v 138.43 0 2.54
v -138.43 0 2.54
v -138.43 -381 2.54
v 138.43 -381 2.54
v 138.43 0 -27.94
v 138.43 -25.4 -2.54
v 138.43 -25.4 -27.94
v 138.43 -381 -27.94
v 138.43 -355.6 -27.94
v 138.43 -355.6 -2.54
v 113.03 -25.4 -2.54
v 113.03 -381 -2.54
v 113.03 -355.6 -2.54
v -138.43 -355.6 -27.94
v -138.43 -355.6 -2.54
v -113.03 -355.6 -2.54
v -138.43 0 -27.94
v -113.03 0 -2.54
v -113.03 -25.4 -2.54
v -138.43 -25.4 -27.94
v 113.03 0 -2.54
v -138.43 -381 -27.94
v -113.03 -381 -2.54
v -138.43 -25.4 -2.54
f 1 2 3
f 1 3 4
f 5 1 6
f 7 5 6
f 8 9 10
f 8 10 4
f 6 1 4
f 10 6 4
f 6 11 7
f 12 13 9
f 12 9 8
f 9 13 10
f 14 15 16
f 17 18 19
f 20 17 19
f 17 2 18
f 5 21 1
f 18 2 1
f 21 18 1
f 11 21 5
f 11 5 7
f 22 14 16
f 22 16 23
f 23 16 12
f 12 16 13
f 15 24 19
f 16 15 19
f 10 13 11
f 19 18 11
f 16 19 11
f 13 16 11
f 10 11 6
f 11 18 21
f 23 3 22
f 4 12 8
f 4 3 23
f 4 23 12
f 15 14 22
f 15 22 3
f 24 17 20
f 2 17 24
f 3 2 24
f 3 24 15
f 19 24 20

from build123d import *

# Parameters (mm, degrees)
F0_W     = 276.86
F0_H     = 5.08
F1_DEPTH = 381
F2_W     = 25.4
F2_H     = 25.4
F3_DEPTH = 25.4
F4_SIZE  = 25.39999
F5_SIZE  = 25.39999


# Not quite as in the source:
# - a fillet or chamfer is up to 0.001 mm smaller than in the source, because OpenCascade refuses the exact size


with BuildPart() as f1:
    # F0 (on Front) → F1 (new body)
    with BuildSketch(Plane.XZ):
        Rectangle(F0_W, F0_H)
    extrude(amount=F1_DEPTH)

    # F2 (on face) → F3 (join)
    with BuildSketch(Plane(origin=(0, 0, -2.54), x_dir=(1, 0, 0), z_dir=(0, 0, -1))):
        with Locations((125.73, 368.3)):
            Rectangle(F2_W, F2_H)
        with Locations((-125.73, 368.3)):
            Rectangle(F2_W, F2_H)
        with Locations((-125.73, 12.7)):
            Rectangle(F2_W, F2_H)
        with Locations((125.73, 12.7)):
            Rectangle(F2_W, F2_H)
    extrude(amount=F3_DEPTH)

    # F4 (size 25.4 in the source; OpenCascade refuses exactly that, so slightly less here)
    f4_edges = [f1.edges().sort_by_distance(p)[0] for p in [
        (-113.03, -368.3, -27.94),
    ]]
    chamfer(f4_edges, length=F4_SIZE)

    # F5 (size 25.4 in the source; OpenCascade refuses exactly that, so slightly less here)
    f5_edges = [f1.edges().sort_by_distance(p)[0] for p in [
        (113.03, -368.3, -27.94),
        (113.03, -12.7, -27.94),
        (-113.03, -12.7, -27.94),
    ]]
    chamfer(f5_edges, length=F5_SIZE)


solid = f1.part
